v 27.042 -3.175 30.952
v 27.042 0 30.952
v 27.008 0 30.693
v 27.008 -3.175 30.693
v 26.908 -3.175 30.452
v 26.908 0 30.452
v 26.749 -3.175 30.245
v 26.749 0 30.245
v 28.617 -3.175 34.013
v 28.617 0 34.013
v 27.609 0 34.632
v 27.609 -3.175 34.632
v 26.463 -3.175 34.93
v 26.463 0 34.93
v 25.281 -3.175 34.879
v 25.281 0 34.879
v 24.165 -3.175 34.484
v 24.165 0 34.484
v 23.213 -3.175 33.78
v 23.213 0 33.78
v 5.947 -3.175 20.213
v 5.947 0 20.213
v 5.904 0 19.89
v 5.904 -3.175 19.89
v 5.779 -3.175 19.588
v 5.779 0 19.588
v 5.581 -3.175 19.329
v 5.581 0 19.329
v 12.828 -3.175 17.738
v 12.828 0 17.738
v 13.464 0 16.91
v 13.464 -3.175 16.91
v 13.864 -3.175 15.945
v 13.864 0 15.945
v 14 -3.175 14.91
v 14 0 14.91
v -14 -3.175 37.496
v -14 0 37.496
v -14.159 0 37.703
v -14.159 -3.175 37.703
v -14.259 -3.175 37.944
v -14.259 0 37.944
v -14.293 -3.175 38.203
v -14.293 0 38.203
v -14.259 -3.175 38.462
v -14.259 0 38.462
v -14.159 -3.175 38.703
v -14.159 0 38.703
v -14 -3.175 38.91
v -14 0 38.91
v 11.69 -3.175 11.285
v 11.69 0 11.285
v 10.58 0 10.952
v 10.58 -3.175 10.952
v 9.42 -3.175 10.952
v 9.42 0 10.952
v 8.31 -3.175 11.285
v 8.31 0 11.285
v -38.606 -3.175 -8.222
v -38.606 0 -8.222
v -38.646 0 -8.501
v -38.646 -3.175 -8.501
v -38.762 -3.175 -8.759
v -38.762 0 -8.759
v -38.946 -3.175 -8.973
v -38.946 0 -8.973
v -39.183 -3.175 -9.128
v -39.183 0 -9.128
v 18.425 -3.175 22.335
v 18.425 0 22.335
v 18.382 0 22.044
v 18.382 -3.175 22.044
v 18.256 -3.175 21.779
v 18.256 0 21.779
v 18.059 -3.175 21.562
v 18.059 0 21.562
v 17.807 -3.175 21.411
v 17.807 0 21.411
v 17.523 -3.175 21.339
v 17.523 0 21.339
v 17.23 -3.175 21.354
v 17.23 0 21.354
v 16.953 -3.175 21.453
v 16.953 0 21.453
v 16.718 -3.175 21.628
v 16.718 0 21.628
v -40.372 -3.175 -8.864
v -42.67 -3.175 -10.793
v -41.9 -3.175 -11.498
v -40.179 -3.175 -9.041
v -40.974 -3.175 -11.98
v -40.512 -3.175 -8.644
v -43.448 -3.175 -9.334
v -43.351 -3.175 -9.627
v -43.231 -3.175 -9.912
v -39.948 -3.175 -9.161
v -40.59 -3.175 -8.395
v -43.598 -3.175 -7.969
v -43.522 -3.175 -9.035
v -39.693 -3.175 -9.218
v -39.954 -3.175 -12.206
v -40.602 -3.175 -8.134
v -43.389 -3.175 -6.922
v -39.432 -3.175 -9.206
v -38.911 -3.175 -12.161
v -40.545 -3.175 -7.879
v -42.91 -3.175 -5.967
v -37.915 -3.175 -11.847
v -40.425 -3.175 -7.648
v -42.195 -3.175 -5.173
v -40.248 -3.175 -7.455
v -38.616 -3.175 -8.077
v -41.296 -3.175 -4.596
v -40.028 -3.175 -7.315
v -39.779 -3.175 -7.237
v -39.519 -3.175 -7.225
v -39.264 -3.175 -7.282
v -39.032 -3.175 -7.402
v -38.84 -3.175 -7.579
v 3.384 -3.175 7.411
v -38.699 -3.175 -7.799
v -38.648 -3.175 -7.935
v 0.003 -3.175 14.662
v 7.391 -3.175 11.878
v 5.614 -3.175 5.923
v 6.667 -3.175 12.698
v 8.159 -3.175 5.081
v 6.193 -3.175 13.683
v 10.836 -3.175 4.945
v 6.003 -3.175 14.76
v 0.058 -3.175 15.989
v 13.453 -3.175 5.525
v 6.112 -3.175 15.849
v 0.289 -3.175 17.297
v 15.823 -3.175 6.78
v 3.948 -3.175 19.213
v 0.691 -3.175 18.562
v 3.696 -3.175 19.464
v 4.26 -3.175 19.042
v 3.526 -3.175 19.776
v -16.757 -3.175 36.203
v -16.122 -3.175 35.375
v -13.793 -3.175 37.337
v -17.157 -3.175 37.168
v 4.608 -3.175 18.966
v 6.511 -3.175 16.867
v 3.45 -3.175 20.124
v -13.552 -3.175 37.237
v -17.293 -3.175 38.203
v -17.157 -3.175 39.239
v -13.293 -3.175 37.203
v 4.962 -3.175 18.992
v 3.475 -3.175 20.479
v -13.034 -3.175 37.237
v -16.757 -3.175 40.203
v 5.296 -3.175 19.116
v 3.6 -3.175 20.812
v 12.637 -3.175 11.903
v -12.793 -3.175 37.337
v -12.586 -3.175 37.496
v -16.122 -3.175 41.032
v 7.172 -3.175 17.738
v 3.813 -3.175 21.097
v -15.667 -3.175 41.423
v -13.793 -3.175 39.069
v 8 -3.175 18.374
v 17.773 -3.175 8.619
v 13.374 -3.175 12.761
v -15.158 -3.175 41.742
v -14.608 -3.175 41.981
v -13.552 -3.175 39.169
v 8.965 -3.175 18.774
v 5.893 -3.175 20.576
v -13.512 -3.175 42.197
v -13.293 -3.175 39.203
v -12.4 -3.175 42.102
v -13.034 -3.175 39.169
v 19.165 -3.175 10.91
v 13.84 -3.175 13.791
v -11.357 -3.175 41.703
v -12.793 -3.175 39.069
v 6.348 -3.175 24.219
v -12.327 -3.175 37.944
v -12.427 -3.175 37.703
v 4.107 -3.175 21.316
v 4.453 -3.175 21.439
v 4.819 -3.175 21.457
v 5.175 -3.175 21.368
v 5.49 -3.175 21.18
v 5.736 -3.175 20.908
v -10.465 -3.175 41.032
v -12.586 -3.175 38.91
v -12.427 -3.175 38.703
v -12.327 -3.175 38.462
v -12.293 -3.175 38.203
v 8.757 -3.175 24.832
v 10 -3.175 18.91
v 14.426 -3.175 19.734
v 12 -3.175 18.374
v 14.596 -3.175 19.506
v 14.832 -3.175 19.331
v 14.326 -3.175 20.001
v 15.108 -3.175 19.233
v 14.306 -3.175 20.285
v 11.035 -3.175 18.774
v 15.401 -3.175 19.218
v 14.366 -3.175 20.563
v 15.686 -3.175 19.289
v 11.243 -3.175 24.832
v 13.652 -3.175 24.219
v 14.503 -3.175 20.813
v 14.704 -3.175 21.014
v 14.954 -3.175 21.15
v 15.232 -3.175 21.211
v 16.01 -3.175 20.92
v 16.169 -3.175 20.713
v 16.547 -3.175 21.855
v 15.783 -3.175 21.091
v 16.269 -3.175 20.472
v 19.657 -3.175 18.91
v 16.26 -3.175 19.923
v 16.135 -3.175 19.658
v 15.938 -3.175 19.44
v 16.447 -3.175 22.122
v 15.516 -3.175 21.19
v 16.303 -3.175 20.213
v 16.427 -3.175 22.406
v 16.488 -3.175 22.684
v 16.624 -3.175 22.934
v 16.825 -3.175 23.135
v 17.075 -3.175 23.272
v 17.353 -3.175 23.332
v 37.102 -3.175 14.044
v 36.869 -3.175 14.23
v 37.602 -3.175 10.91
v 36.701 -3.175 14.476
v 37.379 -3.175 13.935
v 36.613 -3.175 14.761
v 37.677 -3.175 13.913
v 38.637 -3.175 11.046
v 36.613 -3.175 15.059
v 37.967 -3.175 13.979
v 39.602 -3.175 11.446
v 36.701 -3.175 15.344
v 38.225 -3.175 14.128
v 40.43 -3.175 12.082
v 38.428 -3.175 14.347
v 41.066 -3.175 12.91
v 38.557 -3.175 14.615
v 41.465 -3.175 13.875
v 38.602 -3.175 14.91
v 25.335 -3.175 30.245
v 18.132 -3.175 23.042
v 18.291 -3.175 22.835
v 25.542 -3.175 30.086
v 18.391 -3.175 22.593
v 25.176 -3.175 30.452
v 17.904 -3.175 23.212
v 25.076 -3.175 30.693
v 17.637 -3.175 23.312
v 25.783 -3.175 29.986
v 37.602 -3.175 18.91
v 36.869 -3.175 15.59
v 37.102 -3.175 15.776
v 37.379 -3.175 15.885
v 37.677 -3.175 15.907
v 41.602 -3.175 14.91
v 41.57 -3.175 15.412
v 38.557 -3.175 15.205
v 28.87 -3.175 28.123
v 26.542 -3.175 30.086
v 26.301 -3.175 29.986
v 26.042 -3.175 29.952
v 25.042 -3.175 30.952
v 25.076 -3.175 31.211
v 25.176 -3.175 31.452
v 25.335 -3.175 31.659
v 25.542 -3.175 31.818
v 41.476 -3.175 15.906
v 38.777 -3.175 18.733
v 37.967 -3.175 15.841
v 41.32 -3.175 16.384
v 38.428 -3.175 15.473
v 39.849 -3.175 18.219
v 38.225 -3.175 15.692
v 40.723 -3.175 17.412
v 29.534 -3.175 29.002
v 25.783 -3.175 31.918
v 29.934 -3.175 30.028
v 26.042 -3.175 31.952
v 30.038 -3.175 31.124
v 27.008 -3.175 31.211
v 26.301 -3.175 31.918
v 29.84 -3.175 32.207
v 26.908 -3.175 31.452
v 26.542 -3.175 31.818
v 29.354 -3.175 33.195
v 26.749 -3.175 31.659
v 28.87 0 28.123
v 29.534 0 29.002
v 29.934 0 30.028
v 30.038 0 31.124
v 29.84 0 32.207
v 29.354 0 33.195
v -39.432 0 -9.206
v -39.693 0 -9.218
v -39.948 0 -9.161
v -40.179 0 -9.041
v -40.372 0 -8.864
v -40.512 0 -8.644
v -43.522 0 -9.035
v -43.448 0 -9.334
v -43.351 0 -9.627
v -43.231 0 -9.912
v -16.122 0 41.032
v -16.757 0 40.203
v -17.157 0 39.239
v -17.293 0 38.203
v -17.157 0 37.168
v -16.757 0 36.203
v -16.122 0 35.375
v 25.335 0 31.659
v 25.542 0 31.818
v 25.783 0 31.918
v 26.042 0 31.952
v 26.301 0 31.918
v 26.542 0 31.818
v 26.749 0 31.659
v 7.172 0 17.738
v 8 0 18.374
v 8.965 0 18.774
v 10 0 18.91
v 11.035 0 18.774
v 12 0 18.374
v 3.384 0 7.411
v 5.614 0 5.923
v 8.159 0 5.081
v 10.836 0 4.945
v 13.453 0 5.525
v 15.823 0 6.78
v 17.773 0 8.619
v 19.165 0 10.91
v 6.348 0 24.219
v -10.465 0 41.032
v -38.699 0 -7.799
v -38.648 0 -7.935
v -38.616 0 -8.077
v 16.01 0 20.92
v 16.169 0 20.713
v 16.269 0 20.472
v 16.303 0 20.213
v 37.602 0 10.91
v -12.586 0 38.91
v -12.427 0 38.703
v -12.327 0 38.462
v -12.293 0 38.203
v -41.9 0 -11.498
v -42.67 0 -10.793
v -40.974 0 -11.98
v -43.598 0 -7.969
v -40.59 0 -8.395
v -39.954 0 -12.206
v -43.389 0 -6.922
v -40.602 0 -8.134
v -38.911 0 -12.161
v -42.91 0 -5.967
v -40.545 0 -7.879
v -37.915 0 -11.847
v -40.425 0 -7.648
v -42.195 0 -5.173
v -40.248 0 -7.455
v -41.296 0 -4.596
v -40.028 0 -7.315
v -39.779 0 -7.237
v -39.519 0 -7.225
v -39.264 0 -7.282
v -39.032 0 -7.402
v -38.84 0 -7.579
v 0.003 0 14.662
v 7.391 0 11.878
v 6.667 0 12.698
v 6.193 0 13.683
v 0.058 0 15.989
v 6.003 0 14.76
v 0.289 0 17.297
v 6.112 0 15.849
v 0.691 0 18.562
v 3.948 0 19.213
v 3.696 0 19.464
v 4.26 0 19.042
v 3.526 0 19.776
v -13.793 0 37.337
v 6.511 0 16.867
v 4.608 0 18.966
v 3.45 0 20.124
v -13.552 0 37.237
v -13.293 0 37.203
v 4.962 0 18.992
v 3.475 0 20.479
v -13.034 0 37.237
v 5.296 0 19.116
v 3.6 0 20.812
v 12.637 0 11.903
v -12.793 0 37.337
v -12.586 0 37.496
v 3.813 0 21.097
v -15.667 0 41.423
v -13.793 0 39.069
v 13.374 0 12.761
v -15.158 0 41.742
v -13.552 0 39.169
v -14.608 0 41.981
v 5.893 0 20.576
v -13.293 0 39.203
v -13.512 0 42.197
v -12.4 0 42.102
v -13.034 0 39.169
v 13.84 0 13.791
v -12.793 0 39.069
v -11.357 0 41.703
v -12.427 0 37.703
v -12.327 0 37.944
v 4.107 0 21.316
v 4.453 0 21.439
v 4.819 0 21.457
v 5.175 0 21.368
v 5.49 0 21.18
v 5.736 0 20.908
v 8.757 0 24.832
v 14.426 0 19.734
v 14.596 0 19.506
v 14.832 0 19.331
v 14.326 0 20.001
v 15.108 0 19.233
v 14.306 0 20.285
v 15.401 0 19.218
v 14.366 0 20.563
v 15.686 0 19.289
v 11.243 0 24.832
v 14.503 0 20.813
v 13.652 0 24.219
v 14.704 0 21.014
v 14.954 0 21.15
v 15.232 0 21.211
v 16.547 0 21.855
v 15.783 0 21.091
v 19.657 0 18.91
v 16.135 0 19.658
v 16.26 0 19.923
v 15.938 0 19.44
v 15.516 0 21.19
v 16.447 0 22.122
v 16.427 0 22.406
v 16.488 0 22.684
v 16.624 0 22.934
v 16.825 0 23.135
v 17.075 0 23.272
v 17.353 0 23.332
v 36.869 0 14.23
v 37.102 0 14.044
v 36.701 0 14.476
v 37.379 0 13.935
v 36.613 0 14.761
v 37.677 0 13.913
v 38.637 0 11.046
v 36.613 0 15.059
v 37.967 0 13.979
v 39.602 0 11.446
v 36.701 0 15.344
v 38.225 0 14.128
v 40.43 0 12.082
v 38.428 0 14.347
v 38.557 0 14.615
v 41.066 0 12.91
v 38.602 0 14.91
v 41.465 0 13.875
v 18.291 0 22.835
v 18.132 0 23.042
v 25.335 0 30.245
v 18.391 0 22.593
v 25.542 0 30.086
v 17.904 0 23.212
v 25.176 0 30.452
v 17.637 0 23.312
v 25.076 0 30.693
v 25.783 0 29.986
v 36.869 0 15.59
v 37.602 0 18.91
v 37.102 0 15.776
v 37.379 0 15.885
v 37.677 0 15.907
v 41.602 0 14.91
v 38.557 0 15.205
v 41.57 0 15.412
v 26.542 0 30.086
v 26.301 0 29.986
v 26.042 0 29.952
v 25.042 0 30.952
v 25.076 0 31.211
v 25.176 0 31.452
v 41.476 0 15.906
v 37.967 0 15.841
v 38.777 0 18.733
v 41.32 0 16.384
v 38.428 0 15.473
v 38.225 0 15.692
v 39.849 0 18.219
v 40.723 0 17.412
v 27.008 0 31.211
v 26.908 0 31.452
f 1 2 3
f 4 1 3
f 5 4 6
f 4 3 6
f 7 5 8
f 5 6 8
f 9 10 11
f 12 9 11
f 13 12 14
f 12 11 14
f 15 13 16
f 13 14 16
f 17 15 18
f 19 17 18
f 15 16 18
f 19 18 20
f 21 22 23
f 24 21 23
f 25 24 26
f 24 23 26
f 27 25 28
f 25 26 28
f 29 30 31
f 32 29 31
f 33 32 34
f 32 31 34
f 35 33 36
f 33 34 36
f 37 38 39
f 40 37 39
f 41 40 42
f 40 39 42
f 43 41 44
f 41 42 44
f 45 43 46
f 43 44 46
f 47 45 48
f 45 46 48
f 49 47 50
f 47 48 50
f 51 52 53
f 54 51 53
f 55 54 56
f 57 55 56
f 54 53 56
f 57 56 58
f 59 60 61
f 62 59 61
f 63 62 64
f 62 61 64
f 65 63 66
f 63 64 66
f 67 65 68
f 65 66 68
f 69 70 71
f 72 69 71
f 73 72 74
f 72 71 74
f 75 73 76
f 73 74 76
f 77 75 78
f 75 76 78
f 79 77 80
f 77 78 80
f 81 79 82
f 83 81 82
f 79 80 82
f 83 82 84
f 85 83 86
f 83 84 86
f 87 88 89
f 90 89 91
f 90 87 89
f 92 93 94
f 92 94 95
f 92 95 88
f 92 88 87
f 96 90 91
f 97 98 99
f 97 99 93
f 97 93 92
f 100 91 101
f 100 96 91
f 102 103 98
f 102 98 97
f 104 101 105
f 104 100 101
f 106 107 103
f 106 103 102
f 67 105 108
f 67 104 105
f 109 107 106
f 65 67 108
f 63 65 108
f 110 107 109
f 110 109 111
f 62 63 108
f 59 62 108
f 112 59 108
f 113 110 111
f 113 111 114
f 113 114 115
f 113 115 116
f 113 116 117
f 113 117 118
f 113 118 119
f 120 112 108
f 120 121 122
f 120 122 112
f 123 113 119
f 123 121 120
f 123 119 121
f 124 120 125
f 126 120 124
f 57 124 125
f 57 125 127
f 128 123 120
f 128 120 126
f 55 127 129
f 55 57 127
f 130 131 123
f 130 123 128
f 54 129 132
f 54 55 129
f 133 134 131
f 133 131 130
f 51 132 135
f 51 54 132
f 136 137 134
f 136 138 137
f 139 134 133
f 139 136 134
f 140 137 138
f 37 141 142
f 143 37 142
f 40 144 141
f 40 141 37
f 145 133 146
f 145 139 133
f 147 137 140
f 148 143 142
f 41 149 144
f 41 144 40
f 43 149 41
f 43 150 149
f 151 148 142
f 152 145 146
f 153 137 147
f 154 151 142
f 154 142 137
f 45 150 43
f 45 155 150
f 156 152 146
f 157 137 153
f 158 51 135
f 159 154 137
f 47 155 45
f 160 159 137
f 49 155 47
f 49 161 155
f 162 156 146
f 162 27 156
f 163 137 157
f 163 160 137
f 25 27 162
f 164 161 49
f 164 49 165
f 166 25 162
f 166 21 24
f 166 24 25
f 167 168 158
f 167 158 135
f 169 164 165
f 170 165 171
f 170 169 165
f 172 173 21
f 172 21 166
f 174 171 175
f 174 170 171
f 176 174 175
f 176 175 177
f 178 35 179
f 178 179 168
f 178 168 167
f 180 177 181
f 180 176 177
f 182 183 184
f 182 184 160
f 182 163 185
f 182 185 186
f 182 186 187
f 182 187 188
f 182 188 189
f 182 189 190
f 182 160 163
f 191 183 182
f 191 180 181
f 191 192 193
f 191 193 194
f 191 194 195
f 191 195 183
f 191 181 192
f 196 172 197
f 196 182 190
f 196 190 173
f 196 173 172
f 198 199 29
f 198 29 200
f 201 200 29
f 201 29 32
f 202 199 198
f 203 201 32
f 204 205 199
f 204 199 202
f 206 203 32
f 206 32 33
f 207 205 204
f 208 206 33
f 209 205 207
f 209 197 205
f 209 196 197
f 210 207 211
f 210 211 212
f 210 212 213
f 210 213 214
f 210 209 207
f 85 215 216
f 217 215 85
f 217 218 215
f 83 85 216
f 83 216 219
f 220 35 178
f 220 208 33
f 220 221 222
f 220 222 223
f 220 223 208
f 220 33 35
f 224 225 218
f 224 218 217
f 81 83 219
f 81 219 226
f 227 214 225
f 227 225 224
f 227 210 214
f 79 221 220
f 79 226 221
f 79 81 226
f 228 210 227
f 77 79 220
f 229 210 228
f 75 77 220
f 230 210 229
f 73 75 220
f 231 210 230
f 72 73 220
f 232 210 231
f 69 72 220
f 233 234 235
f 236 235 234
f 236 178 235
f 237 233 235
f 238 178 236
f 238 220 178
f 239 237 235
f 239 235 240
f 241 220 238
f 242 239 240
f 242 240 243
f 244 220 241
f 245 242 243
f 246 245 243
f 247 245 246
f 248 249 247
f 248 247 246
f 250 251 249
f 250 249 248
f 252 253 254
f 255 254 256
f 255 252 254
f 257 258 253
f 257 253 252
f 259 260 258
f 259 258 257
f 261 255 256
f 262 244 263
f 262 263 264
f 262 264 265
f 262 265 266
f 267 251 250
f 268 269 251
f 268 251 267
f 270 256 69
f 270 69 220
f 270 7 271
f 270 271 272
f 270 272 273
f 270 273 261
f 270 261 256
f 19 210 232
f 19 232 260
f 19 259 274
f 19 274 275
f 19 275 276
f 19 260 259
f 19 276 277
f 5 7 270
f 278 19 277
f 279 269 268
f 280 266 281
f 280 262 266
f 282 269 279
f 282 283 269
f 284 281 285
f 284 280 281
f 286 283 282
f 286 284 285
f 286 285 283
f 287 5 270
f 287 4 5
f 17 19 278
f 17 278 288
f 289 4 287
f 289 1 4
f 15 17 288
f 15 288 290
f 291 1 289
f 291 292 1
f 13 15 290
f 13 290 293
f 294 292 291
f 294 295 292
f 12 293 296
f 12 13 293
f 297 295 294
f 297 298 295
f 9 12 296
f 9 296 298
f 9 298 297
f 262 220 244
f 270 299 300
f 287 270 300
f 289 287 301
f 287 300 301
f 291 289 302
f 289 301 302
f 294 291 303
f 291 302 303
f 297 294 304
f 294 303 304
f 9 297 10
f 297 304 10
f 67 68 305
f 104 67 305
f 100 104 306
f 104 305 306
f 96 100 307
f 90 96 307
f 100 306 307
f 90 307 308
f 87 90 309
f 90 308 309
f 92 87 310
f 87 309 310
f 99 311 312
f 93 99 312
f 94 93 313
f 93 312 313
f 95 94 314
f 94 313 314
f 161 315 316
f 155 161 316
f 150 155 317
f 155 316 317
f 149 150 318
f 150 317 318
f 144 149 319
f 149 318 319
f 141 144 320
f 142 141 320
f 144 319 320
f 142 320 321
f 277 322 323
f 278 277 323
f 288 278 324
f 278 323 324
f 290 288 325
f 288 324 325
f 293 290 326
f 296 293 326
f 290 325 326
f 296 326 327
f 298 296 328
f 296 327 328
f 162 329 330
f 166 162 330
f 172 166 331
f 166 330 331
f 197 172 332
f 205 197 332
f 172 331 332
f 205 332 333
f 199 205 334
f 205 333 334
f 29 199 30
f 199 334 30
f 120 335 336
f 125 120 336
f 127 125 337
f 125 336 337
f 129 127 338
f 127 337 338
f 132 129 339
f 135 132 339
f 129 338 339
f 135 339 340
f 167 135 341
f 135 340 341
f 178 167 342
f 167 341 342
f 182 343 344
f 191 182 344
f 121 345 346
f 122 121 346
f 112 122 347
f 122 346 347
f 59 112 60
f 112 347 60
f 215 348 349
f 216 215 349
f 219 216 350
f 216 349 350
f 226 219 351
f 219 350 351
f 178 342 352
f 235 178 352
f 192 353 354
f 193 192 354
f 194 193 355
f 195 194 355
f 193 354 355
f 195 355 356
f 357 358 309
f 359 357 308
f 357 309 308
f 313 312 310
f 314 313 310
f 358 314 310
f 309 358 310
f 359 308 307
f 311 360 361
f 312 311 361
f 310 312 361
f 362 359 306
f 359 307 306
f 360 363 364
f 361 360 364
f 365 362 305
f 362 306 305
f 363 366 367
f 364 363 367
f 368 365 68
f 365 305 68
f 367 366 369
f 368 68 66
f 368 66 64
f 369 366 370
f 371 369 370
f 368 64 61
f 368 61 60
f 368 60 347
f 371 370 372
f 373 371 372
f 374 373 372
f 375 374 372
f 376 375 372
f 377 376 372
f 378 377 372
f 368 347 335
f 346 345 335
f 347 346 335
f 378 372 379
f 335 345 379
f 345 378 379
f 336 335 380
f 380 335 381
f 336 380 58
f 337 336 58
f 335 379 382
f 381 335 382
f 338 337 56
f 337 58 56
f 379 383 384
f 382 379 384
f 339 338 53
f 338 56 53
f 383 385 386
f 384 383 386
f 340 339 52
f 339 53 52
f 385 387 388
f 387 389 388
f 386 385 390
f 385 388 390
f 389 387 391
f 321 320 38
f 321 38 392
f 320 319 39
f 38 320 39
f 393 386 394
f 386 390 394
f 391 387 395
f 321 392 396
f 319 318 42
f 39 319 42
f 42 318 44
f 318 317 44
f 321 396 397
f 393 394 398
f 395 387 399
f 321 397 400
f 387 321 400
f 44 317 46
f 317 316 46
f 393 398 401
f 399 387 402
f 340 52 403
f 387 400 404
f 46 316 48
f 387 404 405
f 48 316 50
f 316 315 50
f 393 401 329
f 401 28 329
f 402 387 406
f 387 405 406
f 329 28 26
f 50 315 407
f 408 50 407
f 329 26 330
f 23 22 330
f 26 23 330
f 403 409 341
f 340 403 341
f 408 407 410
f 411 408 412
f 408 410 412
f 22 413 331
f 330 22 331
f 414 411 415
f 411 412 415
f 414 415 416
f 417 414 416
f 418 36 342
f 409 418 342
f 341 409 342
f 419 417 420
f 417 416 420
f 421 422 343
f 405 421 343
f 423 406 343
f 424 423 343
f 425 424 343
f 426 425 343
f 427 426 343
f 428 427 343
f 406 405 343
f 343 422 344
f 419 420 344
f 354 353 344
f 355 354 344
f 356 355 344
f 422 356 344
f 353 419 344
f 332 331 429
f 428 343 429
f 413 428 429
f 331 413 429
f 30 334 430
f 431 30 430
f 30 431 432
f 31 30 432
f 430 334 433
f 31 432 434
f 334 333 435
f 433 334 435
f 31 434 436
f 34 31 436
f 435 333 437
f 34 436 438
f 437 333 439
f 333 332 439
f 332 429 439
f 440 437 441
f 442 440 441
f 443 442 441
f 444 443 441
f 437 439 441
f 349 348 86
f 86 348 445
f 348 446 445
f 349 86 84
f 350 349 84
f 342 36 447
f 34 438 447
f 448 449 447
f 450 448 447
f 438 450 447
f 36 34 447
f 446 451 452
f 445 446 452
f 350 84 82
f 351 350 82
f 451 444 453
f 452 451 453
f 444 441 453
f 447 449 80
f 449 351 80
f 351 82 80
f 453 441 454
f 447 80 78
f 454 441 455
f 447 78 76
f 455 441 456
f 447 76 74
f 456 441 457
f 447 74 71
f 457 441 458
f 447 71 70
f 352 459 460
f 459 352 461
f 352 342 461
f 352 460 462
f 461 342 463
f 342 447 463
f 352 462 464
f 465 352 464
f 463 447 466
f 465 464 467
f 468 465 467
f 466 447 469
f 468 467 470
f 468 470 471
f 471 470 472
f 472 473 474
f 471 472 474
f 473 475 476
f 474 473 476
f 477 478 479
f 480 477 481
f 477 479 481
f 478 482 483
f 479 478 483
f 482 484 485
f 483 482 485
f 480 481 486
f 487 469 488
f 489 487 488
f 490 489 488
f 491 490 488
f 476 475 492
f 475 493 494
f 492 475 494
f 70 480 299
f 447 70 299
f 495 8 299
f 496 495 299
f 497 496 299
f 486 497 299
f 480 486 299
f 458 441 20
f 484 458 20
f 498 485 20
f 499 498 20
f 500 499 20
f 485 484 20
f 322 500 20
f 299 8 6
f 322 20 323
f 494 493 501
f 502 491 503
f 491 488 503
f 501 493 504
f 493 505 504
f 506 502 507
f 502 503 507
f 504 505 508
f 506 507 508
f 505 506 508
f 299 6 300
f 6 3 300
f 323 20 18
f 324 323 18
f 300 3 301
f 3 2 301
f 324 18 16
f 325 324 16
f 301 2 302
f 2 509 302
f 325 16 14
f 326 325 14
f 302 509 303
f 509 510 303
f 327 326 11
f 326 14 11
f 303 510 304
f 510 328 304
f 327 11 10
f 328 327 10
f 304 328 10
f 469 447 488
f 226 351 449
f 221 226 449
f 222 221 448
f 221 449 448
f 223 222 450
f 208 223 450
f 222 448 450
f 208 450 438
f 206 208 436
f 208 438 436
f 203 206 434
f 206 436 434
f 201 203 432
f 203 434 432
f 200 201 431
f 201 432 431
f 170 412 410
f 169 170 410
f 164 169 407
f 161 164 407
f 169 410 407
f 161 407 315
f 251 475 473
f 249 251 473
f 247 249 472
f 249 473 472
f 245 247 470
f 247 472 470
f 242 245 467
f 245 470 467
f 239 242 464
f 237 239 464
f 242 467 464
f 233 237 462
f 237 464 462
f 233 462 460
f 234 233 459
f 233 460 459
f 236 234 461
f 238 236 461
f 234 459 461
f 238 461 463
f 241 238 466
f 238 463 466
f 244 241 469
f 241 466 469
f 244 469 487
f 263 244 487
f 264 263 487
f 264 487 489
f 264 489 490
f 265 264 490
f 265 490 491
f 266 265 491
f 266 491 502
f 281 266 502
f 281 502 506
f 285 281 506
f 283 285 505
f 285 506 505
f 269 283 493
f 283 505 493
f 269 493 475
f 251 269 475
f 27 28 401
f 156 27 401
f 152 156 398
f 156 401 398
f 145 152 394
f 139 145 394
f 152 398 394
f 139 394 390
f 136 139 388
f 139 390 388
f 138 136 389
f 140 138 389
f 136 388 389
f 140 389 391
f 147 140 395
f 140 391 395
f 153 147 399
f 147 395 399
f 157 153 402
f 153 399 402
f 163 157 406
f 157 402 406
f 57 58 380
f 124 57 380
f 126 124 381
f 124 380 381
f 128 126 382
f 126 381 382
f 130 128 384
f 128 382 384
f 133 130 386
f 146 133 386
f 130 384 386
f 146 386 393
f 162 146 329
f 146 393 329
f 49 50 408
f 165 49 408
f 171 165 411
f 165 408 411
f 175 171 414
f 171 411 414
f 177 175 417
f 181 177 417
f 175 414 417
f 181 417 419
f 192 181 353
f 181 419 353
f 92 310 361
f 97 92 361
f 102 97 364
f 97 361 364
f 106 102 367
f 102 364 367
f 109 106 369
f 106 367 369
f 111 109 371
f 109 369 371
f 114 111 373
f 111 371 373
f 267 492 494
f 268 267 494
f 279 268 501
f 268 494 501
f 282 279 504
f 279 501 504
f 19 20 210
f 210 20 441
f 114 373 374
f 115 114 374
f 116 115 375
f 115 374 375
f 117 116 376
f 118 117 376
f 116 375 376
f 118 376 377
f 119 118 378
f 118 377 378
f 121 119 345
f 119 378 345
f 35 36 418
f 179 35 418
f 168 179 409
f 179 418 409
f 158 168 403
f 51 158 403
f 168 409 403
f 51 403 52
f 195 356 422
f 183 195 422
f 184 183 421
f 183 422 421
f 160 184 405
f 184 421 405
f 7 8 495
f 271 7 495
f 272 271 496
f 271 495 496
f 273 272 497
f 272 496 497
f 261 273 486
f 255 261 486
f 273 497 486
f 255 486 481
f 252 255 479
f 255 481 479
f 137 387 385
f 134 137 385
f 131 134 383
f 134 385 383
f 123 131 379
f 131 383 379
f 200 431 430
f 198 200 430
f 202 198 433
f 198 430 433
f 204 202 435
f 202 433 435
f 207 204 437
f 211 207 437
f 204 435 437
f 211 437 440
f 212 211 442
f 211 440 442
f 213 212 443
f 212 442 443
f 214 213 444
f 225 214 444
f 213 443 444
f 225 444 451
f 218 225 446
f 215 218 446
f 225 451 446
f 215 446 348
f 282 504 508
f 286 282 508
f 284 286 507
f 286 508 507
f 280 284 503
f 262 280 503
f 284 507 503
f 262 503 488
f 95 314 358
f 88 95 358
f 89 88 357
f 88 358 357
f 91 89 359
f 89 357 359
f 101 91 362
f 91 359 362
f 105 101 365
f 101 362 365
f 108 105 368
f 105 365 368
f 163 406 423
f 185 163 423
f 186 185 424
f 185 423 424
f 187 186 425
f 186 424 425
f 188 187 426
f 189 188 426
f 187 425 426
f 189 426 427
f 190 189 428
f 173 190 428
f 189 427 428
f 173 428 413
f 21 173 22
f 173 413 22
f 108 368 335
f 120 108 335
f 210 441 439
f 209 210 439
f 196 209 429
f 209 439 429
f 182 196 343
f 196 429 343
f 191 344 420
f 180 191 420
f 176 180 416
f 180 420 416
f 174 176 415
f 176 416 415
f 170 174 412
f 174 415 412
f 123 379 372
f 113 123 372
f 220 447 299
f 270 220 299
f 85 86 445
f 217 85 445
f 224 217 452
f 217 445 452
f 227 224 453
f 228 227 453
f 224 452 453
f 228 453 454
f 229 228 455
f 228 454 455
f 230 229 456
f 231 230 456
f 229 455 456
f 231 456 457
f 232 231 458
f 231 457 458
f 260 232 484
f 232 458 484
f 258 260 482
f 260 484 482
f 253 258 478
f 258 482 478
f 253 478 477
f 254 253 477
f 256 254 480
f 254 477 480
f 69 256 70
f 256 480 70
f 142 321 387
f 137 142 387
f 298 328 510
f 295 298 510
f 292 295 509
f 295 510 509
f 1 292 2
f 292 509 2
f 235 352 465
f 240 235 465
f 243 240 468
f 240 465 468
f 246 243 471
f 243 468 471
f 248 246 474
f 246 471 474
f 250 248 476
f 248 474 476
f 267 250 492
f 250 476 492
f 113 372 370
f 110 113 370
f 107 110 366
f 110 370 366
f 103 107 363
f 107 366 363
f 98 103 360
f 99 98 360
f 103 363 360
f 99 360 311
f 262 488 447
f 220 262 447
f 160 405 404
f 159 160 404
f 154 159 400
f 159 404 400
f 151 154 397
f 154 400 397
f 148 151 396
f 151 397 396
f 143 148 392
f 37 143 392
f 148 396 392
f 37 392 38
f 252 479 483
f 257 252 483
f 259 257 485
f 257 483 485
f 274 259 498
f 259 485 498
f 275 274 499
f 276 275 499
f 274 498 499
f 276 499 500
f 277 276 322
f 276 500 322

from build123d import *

# Parameters (mm, degrees)
F1_DEPTH = 3.175


# Not quite as in the source:
# - a length typed as a fraction of an inch, garbled in the dataset ("3 / 203.2 mm" for 3/8 in), is restored
# - a feature names something its author has since deleted; it is built from what else it names


with BuildPart() as f1:
    # F0 (on Front) → F1 (new body)
    with BuildSketch(Plane.XZ):
        with BuildLine():
            ThreePointArc((41.6017871916, 14.91), (41.5307431297, 15.6605366323), (41.3201345734, 16.3844126791))
            ThreePointArc((41.3201345734, 16.3844126791), (39.8492690362, 18.218900929), (37.6017871916, 18.91))
            Line((37.6017871916, 18.91), (19.6568542495, 18.91))
            Line((19.6568542495, 18.91), (28.870343186, 28.1234889365))
            ThreePointArc((28.870343186, 28.1234889365), (30.0382240231, 31.1237376944), (28.617137145, 34.0126735442))
            ThreePointArc((28.617137145, 34.0126735442), (25.870094428, 34.9482240231), (23.2134889365, 33.780343186))
            Line((23.2134889365, 33.780343186), (13.6523135737, 24.2191678232))
            ThreePointArc((13.6523135737, 24.2191678232), (10, 24.91), (6.3476864263, 24.2191678232))
            Line((6.3476864263, 24.2191678232), (-10.4648587405, 41.03171299))
            ThreePointArc((-10.4648587405, 41.03171299), (-12.3998071782, 42.1022210835), (-14.6078257676, 41.9811139245))
            ThreePointArc((-14.6078257676, 41.9811139245), (-15.418464559, 41.5920342359), (-16.12171299, 41.03171299))
            ThreePointArc((-16.12171299, 41.03171299), (-17.2932858653, 38.2032858653), (-16.12171299, 35.3748587405))
            Line((-16.12171299, 35.3748587405), (0.6908321768, 18.5623135737))
            ThreePointArc((0.6908321768, 18.5623135737), (0.1519224699, 16.6464817767), (0.003078879, 14.6618707992))
            Line((0.003078879, 14.6618707992), (-41.296146258, -4.5962741581))
            ThreePointArc((-41.296146258, -4.5962741581), (-43.1811508594, -6.4281956325), (-43.5221795995, -9.0345106623))
            ThreePointArc((-43.5221795995, -9.0345106623), (-43.4019791332, -9.4816883664), (-43.2309043592, -9.9119783532))
            ThreePointArc((-43.2309043592, -9.9119783532), (-40.9737537843, -11.9802757894), (-37.9152001641, -11.8467364544))
            Line((-37.9152001641, -11.8467364544), (3.3840249729, 7.4114085029))
            ThreePointArc((3.3840249729, 7.4114085029), (12.1643961394, 5.1470399288), (19.1651513899, 10.91))
            Line((19.1651513899, 10.91), (37.6017871916, 10.91))
            ThreePointArc((37.6017871916, 10.91), (40.4302143163, 12.0815728753), (41.6017871916, 14.91))
        make_face()
        with BuildLine():
            ThreePointArc((-40.5119809981, -8.644123568), (-40.5453658318, -7.8794851629), (-40.0282914728, -7.3151975192))
            ThreePointArc((-40.0282914728, -7.3151975192), (-39.2636530677, -7.2818126855), (-38.699365424, -7.7988870445))
            ThreePointArc((-38.699365424, -7.7988870445), (-38.6293772039, -8.0050656923), (-38.605673211, -8.2215053062))
            ThreePointArc((-38.605673211, -8.2215053062), (-38.7622817652, -8.7588049146), (-39.1830549493, -9.1278130933))
            ThreePointArc((-39.1830549493, -9.1278130933), (-39.9476933544, -9.161197927), (-40.5119809981, -8.644123568))
        make_face(mode=Mode.SUBTRACT)
        with BuildLine():
            ThreePointArc((-12.2932858653, 38.2032858653), (-12.3694063328, 37.8206024329), (-12.5861790841, 37.4961790841))
            ThreePointArc((-12.5861790841, 37.4961790841), (-13.2932858653, 37.2032858653), (-14.0003926465, 37.4961790841))
            ThreePointArc((-14.0003926465, 37.4961790841), (-14.2932858653, 38.2032858653), (-14.0003926465, 38.9103926465))
            ThreePointArc((-14.0003926465, 38.9103926465), (-13.2932858653, 39.2032858653), (-12.5861790841, 38.9103926465))
            ThreePointArc((-12.5861790841, 38.9103926465), (-12.3694063328, 38.5859692976), (-12.2932858653, 38.2032858653))
        make_face(mode=Mode.SUBTRACT)
        with BuildLine():
            ThreePointArc((14, 14.91), (13.3735657833, 12.7608015666), (11.690473047, 11.2847688519))
            ThreePointArc((11.690473047, 11.2847688519), (10, 10.91), (8.309526953, 11.2847688519))
            ThreePointArc((8.309526953, 11.2847688519), (6.060768988, 14.2154072893), (7.1715728753, 17.7384271247))
            ThreePointArc((7.1715728753, 17.7384271247), (10, 18.91), (12.8284271247, 17.7384271247))
            ThreePointArc((12.8284271247, 17.7384271247), (13.69551813, 16.4407337295), (14, 14.91))
        make_face(mode=Mode.SUBTRACT)
        with BuildLine():
            ThreePointArc((5.9466991411, 20.2133008589), (5.8515485567, 19.7349465684), (5.5805826176, 19.3294173824))
            ThreePointArc((5.5805826176, 19.3294173824), (3.8128156646, 19.3294173824), (3.8128156646, 21.0971843354))
            ThreePointArc((3.8128156646, 21.0971843354), (5.1750534316, 21.3681502745), (5.9466991411, 20.2133008589))
        make_face(mode=Mode.SUBTRACT)
        with BuildLine():
            ThreePointArc((16.3033008589, 20.2133008589), (15.6859842913, 19.2894213264), (14.5961940777, 19.5061940777))
            ThreePointArc((14.5961940777, 19.5061940777), (14.5961940777, 20.9204076401), (16.0104076401, 20.9204076401))
            ThreePointArc((16.0104076401, 20.9204076401), (16.2271803914, 20.5959842913), (16.3033008589, 20.2133008589))
        make_face(mode=Mode.SUBTRACT)
        with BuildLine():
            ThreePointArc((36.6017871916, 14.91), (37.6017871916, 15.91), (38.6017871916, 14.91))
            ThreePointArc((38.6017871916, 14.91), (37.6017871916, 13.91), (36.6017871916, 14.91))
        make_face(mode=Mode.SUBTRACT)
        with BuildLine():
            ThreePointArc((18.4246212025, 22.3346212025), (17.8073046348, 21.4107416699), (16.7175144213, 21.6275144213))
            ThreePointArc((16.7175144213, 21.6275144213), (16.7175144213, 23.0417279836), (18.1317279836, 23.0417279836))
            ThreePointArc((18.1317279836, 23.0417279836), (18.348500735, 22.7173046348), (18.4246212025, 22.3346212025))
        make_face(mode=Mode.SUBTRACT)
        with BuildLine():
            ThreePointArc((26.7490228424, 30.24480928), (26.0419160612, 29.9519160612), (25.33480928, 30.24480928))
            ThreePointArc((25.33480928, 30.24480928), (25.0419160612, 30.9519160612), (25.33480928, 31.6590228424))
            ThreePointArc((25.33480928, 31.6590228424), (26.0419160612, 31.9519160612), (26.7490228424, 31.6590228424))
            ThreePointArc((26.7490228424, 31.6590228424), (26.9657955937, 31.3345994936), (27.0419160612, 30.9519160612))
            ThreePointArc((27.0419160612, 30.9519160612), (26.9657955937, 30.5692326289), (26.7490228424, 30.24480928))
        make_face(mode=Mode.SUBTRACT)
    extrude(amount=F1_DEPTH)


solid = f1.part
